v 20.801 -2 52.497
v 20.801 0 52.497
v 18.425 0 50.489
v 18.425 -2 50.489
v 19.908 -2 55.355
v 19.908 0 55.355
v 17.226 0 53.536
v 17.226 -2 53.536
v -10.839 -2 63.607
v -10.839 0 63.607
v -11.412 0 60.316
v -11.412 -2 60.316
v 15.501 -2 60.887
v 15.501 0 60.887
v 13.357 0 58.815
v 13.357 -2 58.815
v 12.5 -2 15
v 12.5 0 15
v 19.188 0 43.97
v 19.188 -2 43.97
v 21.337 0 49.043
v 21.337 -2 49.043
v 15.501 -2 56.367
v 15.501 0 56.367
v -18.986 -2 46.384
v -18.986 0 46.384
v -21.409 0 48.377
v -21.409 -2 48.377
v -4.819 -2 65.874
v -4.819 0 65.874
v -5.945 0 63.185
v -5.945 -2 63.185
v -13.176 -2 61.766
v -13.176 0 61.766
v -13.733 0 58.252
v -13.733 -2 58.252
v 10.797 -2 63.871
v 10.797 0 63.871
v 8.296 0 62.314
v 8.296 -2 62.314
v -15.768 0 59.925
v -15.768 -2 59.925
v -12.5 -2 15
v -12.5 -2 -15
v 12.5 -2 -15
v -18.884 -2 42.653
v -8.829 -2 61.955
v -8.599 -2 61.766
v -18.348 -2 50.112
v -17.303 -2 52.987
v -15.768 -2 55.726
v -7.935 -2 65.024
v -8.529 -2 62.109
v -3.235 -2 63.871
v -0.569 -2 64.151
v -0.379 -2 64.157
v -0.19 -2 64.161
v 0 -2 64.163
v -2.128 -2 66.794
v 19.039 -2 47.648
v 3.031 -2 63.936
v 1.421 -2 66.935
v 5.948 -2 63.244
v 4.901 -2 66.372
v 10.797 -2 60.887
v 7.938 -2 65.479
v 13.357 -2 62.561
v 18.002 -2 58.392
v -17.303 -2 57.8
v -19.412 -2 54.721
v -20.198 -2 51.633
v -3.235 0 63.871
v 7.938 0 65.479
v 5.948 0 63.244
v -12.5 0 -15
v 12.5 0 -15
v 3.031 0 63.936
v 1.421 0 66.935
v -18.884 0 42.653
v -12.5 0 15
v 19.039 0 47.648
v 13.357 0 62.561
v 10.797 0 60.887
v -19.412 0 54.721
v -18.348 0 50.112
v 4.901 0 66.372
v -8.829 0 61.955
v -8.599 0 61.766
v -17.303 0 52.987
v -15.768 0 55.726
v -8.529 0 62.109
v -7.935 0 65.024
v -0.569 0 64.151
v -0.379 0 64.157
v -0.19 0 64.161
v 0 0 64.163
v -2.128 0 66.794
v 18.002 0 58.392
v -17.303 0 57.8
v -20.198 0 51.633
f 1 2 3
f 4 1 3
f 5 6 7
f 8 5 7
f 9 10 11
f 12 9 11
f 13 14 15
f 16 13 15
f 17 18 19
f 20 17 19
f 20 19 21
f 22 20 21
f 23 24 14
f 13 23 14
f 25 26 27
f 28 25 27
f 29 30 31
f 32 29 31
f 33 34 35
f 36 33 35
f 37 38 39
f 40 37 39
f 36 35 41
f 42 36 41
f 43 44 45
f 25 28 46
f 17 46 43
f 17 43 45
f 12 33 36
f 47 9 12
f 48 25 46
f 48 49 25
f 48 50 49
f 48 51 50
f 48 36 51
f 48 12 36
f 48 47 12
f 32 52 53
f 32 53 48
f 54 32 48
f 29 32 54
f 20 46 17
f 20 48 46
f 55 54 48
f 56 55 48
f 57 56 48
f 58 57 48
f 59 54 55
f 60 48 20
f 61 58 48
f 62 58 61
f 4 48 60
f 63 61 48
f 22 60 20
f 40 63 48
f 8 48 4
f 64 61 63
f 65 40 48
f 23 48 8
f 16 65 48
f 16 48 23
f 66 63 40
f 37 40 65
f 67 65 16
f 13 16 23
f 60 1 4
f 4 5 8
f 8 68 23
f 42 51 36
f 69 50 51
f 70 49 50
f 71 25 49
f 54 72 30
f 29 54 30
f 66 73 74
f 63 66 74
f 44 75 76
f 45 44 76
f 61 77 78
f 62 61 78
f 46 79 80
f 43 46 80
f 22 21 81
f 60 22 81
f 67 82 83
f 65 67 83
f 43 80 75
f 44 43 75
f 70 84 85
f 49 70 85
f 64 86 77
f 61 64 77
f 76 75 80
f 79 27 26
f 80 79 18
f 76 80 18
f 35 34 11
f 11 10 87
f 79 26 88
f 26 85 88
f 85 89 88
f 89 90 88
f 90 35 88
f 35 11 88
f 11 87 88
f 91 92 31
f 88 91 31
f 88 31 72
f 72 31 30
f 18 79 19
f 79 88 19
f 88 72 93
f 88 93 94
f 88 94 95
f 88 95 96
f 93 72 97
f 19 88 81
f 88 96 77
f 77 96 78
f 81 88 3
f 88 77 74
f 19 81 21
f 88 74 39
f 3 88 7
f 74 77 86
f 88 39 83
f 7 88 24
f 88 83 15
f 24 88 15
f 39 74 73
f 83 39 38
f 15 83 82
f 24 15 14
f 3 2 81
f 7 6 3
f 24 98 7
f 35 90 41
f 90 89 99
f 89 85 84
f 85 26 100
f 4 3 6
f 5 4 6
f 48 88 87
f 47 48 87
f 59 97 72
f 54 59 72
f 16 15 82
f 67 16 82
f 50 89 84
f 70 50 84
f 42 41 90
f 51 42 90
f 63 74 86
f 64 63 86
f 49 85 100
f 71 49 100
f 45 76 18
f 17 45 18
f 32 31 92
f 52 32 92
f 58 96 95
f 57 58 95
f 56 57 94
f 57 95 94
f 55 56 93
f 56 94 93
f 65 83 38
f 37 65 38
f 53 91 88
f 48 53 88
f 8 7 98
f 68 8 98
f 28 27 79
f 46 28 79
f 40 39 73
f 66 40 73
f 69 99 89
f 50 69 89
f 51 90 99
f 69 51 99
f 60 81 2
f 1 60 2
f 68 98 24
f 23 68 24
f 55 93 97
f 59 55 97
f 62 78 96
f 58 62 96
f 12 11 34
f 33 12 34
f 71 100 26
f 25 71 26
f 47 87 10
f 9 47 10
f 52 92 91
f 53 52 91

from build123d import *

# Parameters (mm, degrees)
F1_DEPTH = 2


with BuildPart() as f1:
    # F0 (on Front) → F1 (new body)
    with BuildSketch(Plane.XZ):
        with BuildLine():
            Line((-12.5, -15), (12.5, -15))
            Line((12.5, -15), (12.5, 15))
            Line((12.5, 15), (19.188319, 43.970291))
            Line((19.188319, 43.970291), (21.337286, 49.042992))
            Line((21.337286, 49.042992), (19.039087, 47.647727))
            Line((19.039087, 47.647727), (20.801328, 52.496947))
            Line((20.801328, 52.496947), (18.424573, 50.489065))
            Line((18.424573, 50.489065), (19.908065, 55.355389))
            Line((19.908065, 55.355389), (17.226272, 53.535521))
            Line((17.226272, 53.535521), (18.002436, 58.392484))
            Line((18.002436, 58.392484), (15.501298, 56.366656))
            Line((15.501298, 56.366656), (15.501298, 60.886702))
            Line((15.501298, 60.886702), (13.357465, 58.815028))
            Line((13.357465, 58.815028), (13.357465, 62.56105))
            Line((13.357465, 62.56105), (10.796777, 60.886702))
            Line((10.796777, 60.886702), (10.796777, 63.871168))
            Line((10.796777, 63.871168), (8.295841, 62.314177))
            Line((8.295841, 62.314177), (7.938334, 65.47904))
            Line((7.938334, 65.47904), (5.947843, 63.244458))
            Line((5.947843, 63.244458), (4.901238, 66.372305))
            Line((4.901238, 66.372305), (3.031312, 63.935702))
            Line((3.031312, 63.935702), (1.420656, 66.934533))
            Line((1.420656, 66.934533), (0, 64.162636))
            ThreePointArc((0, 64.162636), (-0.284516, 64.159145), (-0.568948, 64.151423))
            Line((-0.568948, 64.151423), (-2.127863, 66.794239))
            Line((-2.127863, 66.794239), (-3.23478, 63.871239))
            Line((-3.23478, 63.871239), (-4.81896, 65.873601))
            Line((-4.81896, 65.873601), (-5.945412, 63.184827))
            Line((-5.945412, 63.184827), (-7.934967, 65.02378))
            Line((-7.934967, 65.02378), (-8.529011, 62.109493))
            Line((-8.529011, 62.109493), (-8.599, 61.766136))
            Line((-8.599, 61.766136), (-8.828576, 61.954888))
            Line((-8.828576, 61.954888), (-10.83852, 63.607417))
            Line((-10.83852, 63.607417), (-11.411858, 60.316091))
            Line((-11.411858, 60.316091), (-13.175525, 61.766136))
            Line((-13.175525, 61.766136), (-13.733419, 58.252333))
            Line((-13.733419, 58.252333), (-15.767695, 59.924867))
            Line((-15.767695, 59.924867), (-15.767695, 55.726026))
            Line((-15.767695, 55.726026), (-17.302681, 57.800312))
            Line((-17.302681, 57.800312), (-17.302681, 52.987379))
            Line((-17.302681, 52.987379), (-19.411793, 54.721442))
            Line((-19.411793, 54.721442), (-18.347704, 50.112366))
            Line((-18.347704, 50.112366), (-20.197676, 51.63337))
            Line((-20.197676, 51.63337), (-18.985868, 46.384456))
            Line((-18.985868, 46.384456), (-21.409483, 48.377095))
            Line((-21.409483, 48.377095), (-18.884217, 42.653084))
            Line((-18.884217, 42.653084), (-12.5, 15))
            Line((-12.5, 15), (-12.5, -15))
        make_face()
    extrude(amount=F1_DEPTH)


solid = f1.part
